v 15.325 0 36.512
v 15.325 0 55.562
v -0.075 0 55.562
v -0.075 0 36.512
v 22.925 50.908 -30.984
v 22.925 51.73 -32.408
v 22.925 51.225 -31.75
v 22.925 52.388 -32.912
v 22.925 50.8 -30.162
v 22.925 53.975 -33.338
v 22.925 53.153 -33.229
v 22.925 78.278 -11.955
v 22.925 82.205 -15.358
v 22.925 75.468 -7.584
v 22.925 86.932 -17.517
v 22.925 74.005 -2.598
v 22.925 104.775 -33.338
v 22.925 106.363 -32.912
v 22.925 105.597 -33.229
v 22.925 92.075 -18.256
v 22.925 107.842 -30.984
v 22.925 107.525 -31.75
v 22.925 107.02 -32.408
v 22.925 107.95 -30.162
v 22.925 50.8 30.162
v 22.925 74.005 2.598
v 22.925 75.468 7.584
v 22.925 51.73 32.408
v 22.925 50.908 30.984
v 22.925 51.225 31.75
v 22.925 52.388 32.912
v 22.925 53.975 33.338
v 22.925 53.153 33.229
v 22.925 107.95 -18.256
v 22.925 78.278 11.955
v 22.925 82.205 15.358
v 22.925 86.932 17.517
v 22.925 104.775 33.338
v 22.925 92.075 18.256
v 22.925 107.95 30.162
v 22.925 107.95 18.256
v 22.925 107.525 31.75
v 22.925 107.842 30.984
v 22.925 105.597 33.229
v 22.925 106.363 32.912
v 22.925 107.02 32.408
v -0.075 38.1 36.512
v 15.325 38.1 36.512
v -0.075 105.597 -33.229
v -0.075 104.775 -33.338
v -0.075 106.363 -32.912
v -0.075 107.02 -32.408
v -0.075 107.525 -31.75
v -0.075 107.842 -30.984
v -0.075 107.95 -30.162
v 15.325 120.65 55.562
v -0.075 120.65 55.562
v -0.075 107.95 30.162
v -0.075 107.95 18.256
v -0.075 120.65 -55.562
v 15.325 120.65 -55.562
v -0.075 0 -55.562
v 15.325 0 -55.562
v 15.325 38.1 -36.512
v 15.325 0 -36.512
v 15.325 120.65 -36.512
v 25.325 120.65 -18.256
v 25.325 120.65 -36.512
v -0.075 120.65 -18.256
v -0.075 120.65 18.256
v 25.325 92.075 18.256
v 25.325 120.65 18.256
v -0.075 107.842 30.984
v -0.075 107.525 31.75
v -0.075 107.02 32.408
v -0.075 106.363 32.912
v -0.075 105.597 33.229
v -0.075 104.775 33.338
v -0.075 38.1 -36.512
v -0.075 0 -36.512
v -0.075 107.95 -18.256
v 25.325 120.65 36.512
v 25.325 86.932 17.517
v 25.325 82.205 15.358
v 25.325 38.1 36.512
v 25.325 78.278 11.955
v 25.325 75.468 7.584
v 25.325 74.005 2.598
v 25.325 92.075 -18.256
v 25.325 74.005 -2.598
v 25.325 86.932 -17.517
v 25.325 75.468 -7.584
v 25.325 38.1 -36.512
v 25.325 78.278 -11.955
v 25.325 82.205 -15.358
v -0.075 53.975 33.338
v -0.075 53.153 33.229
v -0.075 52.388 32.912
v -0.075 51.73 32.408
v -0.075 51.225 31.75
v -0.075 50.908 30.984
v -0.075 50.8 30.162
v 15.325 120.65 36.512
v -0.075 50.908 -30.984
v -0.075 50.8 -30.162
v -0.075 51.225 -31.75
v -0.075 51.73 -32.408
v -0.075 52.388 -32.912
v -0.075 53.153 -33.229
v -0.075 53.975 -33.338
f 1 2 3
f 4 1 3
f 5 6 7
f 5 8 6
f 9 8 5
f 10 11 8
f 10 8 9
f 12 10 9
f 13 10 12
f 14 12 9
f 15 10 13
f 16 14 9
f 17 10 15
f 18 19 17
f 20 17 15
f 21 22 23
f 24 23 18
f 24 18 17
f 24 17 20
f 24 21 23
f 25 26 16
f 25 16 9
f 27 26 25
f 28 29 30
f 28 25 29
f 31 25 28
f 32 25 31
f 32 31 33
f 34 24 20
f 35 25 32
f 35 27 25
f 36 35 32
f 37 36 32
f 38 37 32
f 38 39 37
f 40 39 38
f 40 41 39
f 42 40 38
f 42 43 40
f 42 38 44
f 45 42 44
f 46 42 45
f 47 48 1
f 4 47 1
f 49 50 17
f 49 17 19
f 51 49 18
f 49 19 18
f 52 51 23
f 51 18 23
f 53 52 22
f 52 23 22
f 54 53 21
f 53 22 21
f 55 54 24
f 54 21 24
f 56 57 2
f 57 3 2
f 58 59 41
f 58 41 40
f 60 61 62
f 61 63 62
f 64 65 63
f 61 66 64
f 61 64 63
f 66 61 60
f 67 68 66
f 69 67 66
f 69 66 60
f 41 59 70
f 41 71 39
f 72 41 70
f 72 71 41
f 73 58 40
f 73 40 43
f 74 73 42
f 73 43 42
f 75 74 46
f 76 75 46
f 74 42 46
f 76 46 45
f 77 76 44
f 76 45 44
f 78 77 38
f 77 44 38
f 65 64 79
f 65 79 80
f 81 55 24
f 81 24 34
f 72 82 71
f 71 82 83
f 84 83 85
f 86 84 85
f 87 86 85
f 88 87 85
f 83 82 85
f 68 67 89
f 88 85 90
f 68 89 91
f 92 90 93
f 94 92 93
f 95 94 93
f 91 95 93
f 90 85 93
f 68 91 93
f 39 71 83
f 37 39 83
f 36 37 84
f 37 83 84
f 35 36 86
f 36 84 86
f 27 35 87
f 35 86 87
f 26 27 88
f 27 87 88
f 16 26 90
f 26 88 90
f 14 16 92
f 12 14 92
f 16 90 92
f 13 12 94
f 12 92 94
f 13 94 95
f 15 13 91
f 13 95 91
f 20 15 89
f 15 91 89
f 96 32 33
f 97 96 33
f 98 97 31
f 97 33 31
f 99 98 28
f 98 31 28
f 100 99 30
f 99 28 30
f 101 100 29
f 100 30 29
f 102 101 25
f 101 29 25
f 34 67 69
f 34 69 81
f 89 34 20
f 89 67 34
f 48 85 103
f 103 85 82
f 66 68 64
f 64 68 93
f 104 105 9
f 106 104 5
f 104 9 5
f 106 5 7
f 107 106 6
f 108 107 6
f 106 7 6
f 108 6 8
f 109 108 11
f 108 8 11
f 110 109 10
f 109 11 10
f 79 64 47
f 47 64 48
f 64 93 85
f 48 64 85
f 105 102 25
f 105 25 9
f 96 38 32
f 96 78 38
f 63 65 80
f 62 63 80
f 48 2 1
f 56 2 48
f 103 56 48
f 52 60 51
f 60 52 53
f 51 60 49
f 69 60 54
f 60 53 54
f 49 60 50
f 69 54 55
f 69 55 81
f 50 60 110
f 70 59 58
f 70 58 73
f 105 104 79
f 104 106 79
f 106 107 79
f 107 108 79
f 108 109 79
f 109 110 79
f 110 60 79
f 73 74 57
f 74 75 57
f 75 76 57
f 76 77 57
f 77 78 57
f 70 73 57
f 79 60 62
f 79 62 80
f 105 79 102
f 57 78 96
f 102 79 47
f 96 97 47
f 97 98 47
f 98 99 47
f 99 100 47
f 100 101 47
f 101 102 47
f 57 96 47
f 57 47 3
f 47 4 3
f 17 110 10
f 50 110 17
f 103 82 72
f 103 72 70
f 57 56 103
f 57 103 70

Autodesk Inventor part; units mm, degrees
ref_plane "YZ Plane" through (0, 0, 0) normal (1, 0, 0) x (0, 1, 0)
ref_plane "XZ Plane" through (0, 0, 0) normal (0, 1, 0) x (-1, 0, 0)
ref_plane "XY Plane" through (0, 0, 0) normal (0, 0, 1) x (1, 0, 0)
sketch "Sketch1" plane through (0, 0, 0) normal (0, 1, 0) x (-1, 0, 0)
  line L0 (0.0752, 55.5625) -> (-25.3248, 55.5625)
  line L1 (-25.3248, 55.5625) -> (-25.3248, -55.5625)
  line L2 (-25.3248, -55.5625) -> (0.0752, -55.5625)
  line L3 (0.0752, -55.5625) -> (0.0752, 55.5625)
  line L4 (54.9786, 0) -> (-47.41, 0) construction
  point P0 (0, 0)
  dimension "d0" = 111.125
  dimension "d1" = 25.4
extrude "Extrusion1" add sketch "Sketch1" along normal blind 120.65
sketch "Sketch2" plane through (25.3248, 0, 55.5625) normal (1, 0, 0) x (0, 0, -1)
  line L0 (55.5625, 0) -> (55.5625, 120.65) construction
  line L1 (0, 120.65) -> (111.125, 120.65) construction
  line L2 (19.05, 120.65) -> (92.075, 120.65)
  line L3 (92.075, 120.65) -> (92.075, 38.1)
  line L4 (92.075, 38.1) -> (19.05, 38.1)
  line L5 (19.05, 38.1) -> (19.05, 120.65)
  line L6 (19.05, 38.1) -> (19.05, 0)
  line L7 (0, 0) -> (111.125, 0) projected
  line L8 (92.075, 38.1) -> (92.075, 0)
  dimension "d4" = 82.55
  dimension "d10" = 73.025
extrude "Extrusion2" cut sketch "Sketch2" against normal blind 120.65 contours L4 L8 L7 L6
sketch "Sketch3" plane through (25.3248, 0, -55.5625) normal (1, 0, 0) x (0, 0, -1)
  line L0 (-92.075, 38.1) -> (-92.075, 120.65) projected
  line L1 (-19.05, 120.65) -> (-19.05, 38.1) projected
  line L2 (0, 0) -> (0, 120.65) projected
  line L3 (-111.125, 120.65) -> (0, 120.65) construction
  line L4 (-111.125, 0) -> (0, 0) projected
  line L5 (-111.125, 0) -> (-111.125, 120.65) projected
  line L6 (-19.05, 38.1) -> (-19.05, 0) projected
  line L7 (-92.075, 120.65) -> (-19.05, 120.65)
  line L8 (-19.05, 120.65) -> (-19.05, 38.1)
  line L9 (-19.05, 38.1) -> (-92.075, 38.1)
  line L10 (-92.075, 38.1) -> (-92.075, 120.65)
  line L11 (-92.075, 0) -> (-92.075, 38.1) projected
  line L12 (-111.125, 120.65) -> (-92.075, 120.65)
  line L13 (-92.075, 120.65) -> (-92.075, 0)
  line L14 (-92.075, 0) -> (-111.125, 0)
  line L15 (-111.125, 0) -> (-111.125, 120.65)
  line L16 (-19.05, 120.65) -> (0, 120.65)
  line L17 (0, 120.65) -> (0, 0)
  line L18 (0, 0) -> (-19.05, 0)
  line L19 (-19.05, 0) -> (-19.05, 120.65)
  point P0 (-55.5625, 0)
extrude "Extrusion3" cut sketch "Sketch3" against normal blind 10 contours L11 L4 L5 L12 L0 | L1 L16 L2 L4 L6
sketch "Sketch4" plane through (-0.0752, 0, 55.5625) normal (-1, 0, 0) x (0, 0, 1)
  line L0 (-92.075, 0) -> (-92.075, 38.1) projected
  line L1 (-92.075, 38.1) -> (-19.05, 38.1) projected
  line L2 (-19.05, 38.1) -> (-19.05, 0) projected
  line L3 (-19.05, 0) -> (0, 0) projected
  line L4 (0, 0) -> (0, 120.65) projected
  line L5 (-111.125, 120.65) -> (0, 120.65) projected
  line L6 (-111.125, 0) -> (-111.125, 120.65) projected
  line L7 (-111.125, 0) -> (-92.075, 0) projected
  line L8 (-55.5625, 0) -> (-55.5625, 120.65) construction
  line L9 (-111.125, 120.65) -> (0, 120.65) construction
  line L10 (-88.9, 107.95) -> (-22.225, 107.95)
  line L11 (-22.225, 107.95) -> (-22.225, 50.8)
  line L12 (-22.225, 50.8) -> (-88.9, 50.8)
  line L13 (-88.9, 50.8) -> (-88.9, 107.95)
  dimension "d9" = 66.675
  dimension "d11" = 12.7
  dimension "d12" = 12.7
extrude "Extrusion4" cut sketch "Sketch4" against normal blind 23 contours L10 L11 L12 L13
sketch "Sketch5" plane through (25.3248, 38.1, 36.5125) normal (1, 0, 0) x (0, 0, -1)
  line L0 (36.5125, -38.1) -> (36.5125, 82.55) construction
  line L1 (0, 82.55) -> (73.025, 82.55) construction
  line L2 (18.2562, 82.55) -> (54.7687, 82.55)
  line L3 (54.7687, 82.55) -> (54.7687, 53.975)
  line L4 (54.7687, 53.975) -> (18.2562, 53.975)
  line L5 (18.2562, 53.975) -> (18.2562, 82.55)
  circle A0 centre (36.5125, 53.975) radius 18.2563
  dimension "d16" = 36.5125
  dimension "d17" = 28.575
fillet "Fillet1" radius 3.175 4 edges at (11.4248, 107.95, 33.3375) (11.4248, 50.8, 33.3375) (11.4248, 50.8, -33.3375) (11.4248, 107.95, -33.3375)
extrude "Extrusion5" cut sketch "Sketch5" against normal blind 25.4
sketch "Sketch6" plane through (25.3248, 38.1, 36.5125) normal (1, 0, 0) x (0, 0, -1)
  point P0 (36.5125, -38.1)
sketch "Sketch7" plane through (0, 120.65, 0) normal (0, 1, 0) x (1, 0, 0)
  point P0 (0, 0)
  point P1 (6.7165, -47.6926)
properties part number "vertical_face_block" material "Aluminum 6061"
